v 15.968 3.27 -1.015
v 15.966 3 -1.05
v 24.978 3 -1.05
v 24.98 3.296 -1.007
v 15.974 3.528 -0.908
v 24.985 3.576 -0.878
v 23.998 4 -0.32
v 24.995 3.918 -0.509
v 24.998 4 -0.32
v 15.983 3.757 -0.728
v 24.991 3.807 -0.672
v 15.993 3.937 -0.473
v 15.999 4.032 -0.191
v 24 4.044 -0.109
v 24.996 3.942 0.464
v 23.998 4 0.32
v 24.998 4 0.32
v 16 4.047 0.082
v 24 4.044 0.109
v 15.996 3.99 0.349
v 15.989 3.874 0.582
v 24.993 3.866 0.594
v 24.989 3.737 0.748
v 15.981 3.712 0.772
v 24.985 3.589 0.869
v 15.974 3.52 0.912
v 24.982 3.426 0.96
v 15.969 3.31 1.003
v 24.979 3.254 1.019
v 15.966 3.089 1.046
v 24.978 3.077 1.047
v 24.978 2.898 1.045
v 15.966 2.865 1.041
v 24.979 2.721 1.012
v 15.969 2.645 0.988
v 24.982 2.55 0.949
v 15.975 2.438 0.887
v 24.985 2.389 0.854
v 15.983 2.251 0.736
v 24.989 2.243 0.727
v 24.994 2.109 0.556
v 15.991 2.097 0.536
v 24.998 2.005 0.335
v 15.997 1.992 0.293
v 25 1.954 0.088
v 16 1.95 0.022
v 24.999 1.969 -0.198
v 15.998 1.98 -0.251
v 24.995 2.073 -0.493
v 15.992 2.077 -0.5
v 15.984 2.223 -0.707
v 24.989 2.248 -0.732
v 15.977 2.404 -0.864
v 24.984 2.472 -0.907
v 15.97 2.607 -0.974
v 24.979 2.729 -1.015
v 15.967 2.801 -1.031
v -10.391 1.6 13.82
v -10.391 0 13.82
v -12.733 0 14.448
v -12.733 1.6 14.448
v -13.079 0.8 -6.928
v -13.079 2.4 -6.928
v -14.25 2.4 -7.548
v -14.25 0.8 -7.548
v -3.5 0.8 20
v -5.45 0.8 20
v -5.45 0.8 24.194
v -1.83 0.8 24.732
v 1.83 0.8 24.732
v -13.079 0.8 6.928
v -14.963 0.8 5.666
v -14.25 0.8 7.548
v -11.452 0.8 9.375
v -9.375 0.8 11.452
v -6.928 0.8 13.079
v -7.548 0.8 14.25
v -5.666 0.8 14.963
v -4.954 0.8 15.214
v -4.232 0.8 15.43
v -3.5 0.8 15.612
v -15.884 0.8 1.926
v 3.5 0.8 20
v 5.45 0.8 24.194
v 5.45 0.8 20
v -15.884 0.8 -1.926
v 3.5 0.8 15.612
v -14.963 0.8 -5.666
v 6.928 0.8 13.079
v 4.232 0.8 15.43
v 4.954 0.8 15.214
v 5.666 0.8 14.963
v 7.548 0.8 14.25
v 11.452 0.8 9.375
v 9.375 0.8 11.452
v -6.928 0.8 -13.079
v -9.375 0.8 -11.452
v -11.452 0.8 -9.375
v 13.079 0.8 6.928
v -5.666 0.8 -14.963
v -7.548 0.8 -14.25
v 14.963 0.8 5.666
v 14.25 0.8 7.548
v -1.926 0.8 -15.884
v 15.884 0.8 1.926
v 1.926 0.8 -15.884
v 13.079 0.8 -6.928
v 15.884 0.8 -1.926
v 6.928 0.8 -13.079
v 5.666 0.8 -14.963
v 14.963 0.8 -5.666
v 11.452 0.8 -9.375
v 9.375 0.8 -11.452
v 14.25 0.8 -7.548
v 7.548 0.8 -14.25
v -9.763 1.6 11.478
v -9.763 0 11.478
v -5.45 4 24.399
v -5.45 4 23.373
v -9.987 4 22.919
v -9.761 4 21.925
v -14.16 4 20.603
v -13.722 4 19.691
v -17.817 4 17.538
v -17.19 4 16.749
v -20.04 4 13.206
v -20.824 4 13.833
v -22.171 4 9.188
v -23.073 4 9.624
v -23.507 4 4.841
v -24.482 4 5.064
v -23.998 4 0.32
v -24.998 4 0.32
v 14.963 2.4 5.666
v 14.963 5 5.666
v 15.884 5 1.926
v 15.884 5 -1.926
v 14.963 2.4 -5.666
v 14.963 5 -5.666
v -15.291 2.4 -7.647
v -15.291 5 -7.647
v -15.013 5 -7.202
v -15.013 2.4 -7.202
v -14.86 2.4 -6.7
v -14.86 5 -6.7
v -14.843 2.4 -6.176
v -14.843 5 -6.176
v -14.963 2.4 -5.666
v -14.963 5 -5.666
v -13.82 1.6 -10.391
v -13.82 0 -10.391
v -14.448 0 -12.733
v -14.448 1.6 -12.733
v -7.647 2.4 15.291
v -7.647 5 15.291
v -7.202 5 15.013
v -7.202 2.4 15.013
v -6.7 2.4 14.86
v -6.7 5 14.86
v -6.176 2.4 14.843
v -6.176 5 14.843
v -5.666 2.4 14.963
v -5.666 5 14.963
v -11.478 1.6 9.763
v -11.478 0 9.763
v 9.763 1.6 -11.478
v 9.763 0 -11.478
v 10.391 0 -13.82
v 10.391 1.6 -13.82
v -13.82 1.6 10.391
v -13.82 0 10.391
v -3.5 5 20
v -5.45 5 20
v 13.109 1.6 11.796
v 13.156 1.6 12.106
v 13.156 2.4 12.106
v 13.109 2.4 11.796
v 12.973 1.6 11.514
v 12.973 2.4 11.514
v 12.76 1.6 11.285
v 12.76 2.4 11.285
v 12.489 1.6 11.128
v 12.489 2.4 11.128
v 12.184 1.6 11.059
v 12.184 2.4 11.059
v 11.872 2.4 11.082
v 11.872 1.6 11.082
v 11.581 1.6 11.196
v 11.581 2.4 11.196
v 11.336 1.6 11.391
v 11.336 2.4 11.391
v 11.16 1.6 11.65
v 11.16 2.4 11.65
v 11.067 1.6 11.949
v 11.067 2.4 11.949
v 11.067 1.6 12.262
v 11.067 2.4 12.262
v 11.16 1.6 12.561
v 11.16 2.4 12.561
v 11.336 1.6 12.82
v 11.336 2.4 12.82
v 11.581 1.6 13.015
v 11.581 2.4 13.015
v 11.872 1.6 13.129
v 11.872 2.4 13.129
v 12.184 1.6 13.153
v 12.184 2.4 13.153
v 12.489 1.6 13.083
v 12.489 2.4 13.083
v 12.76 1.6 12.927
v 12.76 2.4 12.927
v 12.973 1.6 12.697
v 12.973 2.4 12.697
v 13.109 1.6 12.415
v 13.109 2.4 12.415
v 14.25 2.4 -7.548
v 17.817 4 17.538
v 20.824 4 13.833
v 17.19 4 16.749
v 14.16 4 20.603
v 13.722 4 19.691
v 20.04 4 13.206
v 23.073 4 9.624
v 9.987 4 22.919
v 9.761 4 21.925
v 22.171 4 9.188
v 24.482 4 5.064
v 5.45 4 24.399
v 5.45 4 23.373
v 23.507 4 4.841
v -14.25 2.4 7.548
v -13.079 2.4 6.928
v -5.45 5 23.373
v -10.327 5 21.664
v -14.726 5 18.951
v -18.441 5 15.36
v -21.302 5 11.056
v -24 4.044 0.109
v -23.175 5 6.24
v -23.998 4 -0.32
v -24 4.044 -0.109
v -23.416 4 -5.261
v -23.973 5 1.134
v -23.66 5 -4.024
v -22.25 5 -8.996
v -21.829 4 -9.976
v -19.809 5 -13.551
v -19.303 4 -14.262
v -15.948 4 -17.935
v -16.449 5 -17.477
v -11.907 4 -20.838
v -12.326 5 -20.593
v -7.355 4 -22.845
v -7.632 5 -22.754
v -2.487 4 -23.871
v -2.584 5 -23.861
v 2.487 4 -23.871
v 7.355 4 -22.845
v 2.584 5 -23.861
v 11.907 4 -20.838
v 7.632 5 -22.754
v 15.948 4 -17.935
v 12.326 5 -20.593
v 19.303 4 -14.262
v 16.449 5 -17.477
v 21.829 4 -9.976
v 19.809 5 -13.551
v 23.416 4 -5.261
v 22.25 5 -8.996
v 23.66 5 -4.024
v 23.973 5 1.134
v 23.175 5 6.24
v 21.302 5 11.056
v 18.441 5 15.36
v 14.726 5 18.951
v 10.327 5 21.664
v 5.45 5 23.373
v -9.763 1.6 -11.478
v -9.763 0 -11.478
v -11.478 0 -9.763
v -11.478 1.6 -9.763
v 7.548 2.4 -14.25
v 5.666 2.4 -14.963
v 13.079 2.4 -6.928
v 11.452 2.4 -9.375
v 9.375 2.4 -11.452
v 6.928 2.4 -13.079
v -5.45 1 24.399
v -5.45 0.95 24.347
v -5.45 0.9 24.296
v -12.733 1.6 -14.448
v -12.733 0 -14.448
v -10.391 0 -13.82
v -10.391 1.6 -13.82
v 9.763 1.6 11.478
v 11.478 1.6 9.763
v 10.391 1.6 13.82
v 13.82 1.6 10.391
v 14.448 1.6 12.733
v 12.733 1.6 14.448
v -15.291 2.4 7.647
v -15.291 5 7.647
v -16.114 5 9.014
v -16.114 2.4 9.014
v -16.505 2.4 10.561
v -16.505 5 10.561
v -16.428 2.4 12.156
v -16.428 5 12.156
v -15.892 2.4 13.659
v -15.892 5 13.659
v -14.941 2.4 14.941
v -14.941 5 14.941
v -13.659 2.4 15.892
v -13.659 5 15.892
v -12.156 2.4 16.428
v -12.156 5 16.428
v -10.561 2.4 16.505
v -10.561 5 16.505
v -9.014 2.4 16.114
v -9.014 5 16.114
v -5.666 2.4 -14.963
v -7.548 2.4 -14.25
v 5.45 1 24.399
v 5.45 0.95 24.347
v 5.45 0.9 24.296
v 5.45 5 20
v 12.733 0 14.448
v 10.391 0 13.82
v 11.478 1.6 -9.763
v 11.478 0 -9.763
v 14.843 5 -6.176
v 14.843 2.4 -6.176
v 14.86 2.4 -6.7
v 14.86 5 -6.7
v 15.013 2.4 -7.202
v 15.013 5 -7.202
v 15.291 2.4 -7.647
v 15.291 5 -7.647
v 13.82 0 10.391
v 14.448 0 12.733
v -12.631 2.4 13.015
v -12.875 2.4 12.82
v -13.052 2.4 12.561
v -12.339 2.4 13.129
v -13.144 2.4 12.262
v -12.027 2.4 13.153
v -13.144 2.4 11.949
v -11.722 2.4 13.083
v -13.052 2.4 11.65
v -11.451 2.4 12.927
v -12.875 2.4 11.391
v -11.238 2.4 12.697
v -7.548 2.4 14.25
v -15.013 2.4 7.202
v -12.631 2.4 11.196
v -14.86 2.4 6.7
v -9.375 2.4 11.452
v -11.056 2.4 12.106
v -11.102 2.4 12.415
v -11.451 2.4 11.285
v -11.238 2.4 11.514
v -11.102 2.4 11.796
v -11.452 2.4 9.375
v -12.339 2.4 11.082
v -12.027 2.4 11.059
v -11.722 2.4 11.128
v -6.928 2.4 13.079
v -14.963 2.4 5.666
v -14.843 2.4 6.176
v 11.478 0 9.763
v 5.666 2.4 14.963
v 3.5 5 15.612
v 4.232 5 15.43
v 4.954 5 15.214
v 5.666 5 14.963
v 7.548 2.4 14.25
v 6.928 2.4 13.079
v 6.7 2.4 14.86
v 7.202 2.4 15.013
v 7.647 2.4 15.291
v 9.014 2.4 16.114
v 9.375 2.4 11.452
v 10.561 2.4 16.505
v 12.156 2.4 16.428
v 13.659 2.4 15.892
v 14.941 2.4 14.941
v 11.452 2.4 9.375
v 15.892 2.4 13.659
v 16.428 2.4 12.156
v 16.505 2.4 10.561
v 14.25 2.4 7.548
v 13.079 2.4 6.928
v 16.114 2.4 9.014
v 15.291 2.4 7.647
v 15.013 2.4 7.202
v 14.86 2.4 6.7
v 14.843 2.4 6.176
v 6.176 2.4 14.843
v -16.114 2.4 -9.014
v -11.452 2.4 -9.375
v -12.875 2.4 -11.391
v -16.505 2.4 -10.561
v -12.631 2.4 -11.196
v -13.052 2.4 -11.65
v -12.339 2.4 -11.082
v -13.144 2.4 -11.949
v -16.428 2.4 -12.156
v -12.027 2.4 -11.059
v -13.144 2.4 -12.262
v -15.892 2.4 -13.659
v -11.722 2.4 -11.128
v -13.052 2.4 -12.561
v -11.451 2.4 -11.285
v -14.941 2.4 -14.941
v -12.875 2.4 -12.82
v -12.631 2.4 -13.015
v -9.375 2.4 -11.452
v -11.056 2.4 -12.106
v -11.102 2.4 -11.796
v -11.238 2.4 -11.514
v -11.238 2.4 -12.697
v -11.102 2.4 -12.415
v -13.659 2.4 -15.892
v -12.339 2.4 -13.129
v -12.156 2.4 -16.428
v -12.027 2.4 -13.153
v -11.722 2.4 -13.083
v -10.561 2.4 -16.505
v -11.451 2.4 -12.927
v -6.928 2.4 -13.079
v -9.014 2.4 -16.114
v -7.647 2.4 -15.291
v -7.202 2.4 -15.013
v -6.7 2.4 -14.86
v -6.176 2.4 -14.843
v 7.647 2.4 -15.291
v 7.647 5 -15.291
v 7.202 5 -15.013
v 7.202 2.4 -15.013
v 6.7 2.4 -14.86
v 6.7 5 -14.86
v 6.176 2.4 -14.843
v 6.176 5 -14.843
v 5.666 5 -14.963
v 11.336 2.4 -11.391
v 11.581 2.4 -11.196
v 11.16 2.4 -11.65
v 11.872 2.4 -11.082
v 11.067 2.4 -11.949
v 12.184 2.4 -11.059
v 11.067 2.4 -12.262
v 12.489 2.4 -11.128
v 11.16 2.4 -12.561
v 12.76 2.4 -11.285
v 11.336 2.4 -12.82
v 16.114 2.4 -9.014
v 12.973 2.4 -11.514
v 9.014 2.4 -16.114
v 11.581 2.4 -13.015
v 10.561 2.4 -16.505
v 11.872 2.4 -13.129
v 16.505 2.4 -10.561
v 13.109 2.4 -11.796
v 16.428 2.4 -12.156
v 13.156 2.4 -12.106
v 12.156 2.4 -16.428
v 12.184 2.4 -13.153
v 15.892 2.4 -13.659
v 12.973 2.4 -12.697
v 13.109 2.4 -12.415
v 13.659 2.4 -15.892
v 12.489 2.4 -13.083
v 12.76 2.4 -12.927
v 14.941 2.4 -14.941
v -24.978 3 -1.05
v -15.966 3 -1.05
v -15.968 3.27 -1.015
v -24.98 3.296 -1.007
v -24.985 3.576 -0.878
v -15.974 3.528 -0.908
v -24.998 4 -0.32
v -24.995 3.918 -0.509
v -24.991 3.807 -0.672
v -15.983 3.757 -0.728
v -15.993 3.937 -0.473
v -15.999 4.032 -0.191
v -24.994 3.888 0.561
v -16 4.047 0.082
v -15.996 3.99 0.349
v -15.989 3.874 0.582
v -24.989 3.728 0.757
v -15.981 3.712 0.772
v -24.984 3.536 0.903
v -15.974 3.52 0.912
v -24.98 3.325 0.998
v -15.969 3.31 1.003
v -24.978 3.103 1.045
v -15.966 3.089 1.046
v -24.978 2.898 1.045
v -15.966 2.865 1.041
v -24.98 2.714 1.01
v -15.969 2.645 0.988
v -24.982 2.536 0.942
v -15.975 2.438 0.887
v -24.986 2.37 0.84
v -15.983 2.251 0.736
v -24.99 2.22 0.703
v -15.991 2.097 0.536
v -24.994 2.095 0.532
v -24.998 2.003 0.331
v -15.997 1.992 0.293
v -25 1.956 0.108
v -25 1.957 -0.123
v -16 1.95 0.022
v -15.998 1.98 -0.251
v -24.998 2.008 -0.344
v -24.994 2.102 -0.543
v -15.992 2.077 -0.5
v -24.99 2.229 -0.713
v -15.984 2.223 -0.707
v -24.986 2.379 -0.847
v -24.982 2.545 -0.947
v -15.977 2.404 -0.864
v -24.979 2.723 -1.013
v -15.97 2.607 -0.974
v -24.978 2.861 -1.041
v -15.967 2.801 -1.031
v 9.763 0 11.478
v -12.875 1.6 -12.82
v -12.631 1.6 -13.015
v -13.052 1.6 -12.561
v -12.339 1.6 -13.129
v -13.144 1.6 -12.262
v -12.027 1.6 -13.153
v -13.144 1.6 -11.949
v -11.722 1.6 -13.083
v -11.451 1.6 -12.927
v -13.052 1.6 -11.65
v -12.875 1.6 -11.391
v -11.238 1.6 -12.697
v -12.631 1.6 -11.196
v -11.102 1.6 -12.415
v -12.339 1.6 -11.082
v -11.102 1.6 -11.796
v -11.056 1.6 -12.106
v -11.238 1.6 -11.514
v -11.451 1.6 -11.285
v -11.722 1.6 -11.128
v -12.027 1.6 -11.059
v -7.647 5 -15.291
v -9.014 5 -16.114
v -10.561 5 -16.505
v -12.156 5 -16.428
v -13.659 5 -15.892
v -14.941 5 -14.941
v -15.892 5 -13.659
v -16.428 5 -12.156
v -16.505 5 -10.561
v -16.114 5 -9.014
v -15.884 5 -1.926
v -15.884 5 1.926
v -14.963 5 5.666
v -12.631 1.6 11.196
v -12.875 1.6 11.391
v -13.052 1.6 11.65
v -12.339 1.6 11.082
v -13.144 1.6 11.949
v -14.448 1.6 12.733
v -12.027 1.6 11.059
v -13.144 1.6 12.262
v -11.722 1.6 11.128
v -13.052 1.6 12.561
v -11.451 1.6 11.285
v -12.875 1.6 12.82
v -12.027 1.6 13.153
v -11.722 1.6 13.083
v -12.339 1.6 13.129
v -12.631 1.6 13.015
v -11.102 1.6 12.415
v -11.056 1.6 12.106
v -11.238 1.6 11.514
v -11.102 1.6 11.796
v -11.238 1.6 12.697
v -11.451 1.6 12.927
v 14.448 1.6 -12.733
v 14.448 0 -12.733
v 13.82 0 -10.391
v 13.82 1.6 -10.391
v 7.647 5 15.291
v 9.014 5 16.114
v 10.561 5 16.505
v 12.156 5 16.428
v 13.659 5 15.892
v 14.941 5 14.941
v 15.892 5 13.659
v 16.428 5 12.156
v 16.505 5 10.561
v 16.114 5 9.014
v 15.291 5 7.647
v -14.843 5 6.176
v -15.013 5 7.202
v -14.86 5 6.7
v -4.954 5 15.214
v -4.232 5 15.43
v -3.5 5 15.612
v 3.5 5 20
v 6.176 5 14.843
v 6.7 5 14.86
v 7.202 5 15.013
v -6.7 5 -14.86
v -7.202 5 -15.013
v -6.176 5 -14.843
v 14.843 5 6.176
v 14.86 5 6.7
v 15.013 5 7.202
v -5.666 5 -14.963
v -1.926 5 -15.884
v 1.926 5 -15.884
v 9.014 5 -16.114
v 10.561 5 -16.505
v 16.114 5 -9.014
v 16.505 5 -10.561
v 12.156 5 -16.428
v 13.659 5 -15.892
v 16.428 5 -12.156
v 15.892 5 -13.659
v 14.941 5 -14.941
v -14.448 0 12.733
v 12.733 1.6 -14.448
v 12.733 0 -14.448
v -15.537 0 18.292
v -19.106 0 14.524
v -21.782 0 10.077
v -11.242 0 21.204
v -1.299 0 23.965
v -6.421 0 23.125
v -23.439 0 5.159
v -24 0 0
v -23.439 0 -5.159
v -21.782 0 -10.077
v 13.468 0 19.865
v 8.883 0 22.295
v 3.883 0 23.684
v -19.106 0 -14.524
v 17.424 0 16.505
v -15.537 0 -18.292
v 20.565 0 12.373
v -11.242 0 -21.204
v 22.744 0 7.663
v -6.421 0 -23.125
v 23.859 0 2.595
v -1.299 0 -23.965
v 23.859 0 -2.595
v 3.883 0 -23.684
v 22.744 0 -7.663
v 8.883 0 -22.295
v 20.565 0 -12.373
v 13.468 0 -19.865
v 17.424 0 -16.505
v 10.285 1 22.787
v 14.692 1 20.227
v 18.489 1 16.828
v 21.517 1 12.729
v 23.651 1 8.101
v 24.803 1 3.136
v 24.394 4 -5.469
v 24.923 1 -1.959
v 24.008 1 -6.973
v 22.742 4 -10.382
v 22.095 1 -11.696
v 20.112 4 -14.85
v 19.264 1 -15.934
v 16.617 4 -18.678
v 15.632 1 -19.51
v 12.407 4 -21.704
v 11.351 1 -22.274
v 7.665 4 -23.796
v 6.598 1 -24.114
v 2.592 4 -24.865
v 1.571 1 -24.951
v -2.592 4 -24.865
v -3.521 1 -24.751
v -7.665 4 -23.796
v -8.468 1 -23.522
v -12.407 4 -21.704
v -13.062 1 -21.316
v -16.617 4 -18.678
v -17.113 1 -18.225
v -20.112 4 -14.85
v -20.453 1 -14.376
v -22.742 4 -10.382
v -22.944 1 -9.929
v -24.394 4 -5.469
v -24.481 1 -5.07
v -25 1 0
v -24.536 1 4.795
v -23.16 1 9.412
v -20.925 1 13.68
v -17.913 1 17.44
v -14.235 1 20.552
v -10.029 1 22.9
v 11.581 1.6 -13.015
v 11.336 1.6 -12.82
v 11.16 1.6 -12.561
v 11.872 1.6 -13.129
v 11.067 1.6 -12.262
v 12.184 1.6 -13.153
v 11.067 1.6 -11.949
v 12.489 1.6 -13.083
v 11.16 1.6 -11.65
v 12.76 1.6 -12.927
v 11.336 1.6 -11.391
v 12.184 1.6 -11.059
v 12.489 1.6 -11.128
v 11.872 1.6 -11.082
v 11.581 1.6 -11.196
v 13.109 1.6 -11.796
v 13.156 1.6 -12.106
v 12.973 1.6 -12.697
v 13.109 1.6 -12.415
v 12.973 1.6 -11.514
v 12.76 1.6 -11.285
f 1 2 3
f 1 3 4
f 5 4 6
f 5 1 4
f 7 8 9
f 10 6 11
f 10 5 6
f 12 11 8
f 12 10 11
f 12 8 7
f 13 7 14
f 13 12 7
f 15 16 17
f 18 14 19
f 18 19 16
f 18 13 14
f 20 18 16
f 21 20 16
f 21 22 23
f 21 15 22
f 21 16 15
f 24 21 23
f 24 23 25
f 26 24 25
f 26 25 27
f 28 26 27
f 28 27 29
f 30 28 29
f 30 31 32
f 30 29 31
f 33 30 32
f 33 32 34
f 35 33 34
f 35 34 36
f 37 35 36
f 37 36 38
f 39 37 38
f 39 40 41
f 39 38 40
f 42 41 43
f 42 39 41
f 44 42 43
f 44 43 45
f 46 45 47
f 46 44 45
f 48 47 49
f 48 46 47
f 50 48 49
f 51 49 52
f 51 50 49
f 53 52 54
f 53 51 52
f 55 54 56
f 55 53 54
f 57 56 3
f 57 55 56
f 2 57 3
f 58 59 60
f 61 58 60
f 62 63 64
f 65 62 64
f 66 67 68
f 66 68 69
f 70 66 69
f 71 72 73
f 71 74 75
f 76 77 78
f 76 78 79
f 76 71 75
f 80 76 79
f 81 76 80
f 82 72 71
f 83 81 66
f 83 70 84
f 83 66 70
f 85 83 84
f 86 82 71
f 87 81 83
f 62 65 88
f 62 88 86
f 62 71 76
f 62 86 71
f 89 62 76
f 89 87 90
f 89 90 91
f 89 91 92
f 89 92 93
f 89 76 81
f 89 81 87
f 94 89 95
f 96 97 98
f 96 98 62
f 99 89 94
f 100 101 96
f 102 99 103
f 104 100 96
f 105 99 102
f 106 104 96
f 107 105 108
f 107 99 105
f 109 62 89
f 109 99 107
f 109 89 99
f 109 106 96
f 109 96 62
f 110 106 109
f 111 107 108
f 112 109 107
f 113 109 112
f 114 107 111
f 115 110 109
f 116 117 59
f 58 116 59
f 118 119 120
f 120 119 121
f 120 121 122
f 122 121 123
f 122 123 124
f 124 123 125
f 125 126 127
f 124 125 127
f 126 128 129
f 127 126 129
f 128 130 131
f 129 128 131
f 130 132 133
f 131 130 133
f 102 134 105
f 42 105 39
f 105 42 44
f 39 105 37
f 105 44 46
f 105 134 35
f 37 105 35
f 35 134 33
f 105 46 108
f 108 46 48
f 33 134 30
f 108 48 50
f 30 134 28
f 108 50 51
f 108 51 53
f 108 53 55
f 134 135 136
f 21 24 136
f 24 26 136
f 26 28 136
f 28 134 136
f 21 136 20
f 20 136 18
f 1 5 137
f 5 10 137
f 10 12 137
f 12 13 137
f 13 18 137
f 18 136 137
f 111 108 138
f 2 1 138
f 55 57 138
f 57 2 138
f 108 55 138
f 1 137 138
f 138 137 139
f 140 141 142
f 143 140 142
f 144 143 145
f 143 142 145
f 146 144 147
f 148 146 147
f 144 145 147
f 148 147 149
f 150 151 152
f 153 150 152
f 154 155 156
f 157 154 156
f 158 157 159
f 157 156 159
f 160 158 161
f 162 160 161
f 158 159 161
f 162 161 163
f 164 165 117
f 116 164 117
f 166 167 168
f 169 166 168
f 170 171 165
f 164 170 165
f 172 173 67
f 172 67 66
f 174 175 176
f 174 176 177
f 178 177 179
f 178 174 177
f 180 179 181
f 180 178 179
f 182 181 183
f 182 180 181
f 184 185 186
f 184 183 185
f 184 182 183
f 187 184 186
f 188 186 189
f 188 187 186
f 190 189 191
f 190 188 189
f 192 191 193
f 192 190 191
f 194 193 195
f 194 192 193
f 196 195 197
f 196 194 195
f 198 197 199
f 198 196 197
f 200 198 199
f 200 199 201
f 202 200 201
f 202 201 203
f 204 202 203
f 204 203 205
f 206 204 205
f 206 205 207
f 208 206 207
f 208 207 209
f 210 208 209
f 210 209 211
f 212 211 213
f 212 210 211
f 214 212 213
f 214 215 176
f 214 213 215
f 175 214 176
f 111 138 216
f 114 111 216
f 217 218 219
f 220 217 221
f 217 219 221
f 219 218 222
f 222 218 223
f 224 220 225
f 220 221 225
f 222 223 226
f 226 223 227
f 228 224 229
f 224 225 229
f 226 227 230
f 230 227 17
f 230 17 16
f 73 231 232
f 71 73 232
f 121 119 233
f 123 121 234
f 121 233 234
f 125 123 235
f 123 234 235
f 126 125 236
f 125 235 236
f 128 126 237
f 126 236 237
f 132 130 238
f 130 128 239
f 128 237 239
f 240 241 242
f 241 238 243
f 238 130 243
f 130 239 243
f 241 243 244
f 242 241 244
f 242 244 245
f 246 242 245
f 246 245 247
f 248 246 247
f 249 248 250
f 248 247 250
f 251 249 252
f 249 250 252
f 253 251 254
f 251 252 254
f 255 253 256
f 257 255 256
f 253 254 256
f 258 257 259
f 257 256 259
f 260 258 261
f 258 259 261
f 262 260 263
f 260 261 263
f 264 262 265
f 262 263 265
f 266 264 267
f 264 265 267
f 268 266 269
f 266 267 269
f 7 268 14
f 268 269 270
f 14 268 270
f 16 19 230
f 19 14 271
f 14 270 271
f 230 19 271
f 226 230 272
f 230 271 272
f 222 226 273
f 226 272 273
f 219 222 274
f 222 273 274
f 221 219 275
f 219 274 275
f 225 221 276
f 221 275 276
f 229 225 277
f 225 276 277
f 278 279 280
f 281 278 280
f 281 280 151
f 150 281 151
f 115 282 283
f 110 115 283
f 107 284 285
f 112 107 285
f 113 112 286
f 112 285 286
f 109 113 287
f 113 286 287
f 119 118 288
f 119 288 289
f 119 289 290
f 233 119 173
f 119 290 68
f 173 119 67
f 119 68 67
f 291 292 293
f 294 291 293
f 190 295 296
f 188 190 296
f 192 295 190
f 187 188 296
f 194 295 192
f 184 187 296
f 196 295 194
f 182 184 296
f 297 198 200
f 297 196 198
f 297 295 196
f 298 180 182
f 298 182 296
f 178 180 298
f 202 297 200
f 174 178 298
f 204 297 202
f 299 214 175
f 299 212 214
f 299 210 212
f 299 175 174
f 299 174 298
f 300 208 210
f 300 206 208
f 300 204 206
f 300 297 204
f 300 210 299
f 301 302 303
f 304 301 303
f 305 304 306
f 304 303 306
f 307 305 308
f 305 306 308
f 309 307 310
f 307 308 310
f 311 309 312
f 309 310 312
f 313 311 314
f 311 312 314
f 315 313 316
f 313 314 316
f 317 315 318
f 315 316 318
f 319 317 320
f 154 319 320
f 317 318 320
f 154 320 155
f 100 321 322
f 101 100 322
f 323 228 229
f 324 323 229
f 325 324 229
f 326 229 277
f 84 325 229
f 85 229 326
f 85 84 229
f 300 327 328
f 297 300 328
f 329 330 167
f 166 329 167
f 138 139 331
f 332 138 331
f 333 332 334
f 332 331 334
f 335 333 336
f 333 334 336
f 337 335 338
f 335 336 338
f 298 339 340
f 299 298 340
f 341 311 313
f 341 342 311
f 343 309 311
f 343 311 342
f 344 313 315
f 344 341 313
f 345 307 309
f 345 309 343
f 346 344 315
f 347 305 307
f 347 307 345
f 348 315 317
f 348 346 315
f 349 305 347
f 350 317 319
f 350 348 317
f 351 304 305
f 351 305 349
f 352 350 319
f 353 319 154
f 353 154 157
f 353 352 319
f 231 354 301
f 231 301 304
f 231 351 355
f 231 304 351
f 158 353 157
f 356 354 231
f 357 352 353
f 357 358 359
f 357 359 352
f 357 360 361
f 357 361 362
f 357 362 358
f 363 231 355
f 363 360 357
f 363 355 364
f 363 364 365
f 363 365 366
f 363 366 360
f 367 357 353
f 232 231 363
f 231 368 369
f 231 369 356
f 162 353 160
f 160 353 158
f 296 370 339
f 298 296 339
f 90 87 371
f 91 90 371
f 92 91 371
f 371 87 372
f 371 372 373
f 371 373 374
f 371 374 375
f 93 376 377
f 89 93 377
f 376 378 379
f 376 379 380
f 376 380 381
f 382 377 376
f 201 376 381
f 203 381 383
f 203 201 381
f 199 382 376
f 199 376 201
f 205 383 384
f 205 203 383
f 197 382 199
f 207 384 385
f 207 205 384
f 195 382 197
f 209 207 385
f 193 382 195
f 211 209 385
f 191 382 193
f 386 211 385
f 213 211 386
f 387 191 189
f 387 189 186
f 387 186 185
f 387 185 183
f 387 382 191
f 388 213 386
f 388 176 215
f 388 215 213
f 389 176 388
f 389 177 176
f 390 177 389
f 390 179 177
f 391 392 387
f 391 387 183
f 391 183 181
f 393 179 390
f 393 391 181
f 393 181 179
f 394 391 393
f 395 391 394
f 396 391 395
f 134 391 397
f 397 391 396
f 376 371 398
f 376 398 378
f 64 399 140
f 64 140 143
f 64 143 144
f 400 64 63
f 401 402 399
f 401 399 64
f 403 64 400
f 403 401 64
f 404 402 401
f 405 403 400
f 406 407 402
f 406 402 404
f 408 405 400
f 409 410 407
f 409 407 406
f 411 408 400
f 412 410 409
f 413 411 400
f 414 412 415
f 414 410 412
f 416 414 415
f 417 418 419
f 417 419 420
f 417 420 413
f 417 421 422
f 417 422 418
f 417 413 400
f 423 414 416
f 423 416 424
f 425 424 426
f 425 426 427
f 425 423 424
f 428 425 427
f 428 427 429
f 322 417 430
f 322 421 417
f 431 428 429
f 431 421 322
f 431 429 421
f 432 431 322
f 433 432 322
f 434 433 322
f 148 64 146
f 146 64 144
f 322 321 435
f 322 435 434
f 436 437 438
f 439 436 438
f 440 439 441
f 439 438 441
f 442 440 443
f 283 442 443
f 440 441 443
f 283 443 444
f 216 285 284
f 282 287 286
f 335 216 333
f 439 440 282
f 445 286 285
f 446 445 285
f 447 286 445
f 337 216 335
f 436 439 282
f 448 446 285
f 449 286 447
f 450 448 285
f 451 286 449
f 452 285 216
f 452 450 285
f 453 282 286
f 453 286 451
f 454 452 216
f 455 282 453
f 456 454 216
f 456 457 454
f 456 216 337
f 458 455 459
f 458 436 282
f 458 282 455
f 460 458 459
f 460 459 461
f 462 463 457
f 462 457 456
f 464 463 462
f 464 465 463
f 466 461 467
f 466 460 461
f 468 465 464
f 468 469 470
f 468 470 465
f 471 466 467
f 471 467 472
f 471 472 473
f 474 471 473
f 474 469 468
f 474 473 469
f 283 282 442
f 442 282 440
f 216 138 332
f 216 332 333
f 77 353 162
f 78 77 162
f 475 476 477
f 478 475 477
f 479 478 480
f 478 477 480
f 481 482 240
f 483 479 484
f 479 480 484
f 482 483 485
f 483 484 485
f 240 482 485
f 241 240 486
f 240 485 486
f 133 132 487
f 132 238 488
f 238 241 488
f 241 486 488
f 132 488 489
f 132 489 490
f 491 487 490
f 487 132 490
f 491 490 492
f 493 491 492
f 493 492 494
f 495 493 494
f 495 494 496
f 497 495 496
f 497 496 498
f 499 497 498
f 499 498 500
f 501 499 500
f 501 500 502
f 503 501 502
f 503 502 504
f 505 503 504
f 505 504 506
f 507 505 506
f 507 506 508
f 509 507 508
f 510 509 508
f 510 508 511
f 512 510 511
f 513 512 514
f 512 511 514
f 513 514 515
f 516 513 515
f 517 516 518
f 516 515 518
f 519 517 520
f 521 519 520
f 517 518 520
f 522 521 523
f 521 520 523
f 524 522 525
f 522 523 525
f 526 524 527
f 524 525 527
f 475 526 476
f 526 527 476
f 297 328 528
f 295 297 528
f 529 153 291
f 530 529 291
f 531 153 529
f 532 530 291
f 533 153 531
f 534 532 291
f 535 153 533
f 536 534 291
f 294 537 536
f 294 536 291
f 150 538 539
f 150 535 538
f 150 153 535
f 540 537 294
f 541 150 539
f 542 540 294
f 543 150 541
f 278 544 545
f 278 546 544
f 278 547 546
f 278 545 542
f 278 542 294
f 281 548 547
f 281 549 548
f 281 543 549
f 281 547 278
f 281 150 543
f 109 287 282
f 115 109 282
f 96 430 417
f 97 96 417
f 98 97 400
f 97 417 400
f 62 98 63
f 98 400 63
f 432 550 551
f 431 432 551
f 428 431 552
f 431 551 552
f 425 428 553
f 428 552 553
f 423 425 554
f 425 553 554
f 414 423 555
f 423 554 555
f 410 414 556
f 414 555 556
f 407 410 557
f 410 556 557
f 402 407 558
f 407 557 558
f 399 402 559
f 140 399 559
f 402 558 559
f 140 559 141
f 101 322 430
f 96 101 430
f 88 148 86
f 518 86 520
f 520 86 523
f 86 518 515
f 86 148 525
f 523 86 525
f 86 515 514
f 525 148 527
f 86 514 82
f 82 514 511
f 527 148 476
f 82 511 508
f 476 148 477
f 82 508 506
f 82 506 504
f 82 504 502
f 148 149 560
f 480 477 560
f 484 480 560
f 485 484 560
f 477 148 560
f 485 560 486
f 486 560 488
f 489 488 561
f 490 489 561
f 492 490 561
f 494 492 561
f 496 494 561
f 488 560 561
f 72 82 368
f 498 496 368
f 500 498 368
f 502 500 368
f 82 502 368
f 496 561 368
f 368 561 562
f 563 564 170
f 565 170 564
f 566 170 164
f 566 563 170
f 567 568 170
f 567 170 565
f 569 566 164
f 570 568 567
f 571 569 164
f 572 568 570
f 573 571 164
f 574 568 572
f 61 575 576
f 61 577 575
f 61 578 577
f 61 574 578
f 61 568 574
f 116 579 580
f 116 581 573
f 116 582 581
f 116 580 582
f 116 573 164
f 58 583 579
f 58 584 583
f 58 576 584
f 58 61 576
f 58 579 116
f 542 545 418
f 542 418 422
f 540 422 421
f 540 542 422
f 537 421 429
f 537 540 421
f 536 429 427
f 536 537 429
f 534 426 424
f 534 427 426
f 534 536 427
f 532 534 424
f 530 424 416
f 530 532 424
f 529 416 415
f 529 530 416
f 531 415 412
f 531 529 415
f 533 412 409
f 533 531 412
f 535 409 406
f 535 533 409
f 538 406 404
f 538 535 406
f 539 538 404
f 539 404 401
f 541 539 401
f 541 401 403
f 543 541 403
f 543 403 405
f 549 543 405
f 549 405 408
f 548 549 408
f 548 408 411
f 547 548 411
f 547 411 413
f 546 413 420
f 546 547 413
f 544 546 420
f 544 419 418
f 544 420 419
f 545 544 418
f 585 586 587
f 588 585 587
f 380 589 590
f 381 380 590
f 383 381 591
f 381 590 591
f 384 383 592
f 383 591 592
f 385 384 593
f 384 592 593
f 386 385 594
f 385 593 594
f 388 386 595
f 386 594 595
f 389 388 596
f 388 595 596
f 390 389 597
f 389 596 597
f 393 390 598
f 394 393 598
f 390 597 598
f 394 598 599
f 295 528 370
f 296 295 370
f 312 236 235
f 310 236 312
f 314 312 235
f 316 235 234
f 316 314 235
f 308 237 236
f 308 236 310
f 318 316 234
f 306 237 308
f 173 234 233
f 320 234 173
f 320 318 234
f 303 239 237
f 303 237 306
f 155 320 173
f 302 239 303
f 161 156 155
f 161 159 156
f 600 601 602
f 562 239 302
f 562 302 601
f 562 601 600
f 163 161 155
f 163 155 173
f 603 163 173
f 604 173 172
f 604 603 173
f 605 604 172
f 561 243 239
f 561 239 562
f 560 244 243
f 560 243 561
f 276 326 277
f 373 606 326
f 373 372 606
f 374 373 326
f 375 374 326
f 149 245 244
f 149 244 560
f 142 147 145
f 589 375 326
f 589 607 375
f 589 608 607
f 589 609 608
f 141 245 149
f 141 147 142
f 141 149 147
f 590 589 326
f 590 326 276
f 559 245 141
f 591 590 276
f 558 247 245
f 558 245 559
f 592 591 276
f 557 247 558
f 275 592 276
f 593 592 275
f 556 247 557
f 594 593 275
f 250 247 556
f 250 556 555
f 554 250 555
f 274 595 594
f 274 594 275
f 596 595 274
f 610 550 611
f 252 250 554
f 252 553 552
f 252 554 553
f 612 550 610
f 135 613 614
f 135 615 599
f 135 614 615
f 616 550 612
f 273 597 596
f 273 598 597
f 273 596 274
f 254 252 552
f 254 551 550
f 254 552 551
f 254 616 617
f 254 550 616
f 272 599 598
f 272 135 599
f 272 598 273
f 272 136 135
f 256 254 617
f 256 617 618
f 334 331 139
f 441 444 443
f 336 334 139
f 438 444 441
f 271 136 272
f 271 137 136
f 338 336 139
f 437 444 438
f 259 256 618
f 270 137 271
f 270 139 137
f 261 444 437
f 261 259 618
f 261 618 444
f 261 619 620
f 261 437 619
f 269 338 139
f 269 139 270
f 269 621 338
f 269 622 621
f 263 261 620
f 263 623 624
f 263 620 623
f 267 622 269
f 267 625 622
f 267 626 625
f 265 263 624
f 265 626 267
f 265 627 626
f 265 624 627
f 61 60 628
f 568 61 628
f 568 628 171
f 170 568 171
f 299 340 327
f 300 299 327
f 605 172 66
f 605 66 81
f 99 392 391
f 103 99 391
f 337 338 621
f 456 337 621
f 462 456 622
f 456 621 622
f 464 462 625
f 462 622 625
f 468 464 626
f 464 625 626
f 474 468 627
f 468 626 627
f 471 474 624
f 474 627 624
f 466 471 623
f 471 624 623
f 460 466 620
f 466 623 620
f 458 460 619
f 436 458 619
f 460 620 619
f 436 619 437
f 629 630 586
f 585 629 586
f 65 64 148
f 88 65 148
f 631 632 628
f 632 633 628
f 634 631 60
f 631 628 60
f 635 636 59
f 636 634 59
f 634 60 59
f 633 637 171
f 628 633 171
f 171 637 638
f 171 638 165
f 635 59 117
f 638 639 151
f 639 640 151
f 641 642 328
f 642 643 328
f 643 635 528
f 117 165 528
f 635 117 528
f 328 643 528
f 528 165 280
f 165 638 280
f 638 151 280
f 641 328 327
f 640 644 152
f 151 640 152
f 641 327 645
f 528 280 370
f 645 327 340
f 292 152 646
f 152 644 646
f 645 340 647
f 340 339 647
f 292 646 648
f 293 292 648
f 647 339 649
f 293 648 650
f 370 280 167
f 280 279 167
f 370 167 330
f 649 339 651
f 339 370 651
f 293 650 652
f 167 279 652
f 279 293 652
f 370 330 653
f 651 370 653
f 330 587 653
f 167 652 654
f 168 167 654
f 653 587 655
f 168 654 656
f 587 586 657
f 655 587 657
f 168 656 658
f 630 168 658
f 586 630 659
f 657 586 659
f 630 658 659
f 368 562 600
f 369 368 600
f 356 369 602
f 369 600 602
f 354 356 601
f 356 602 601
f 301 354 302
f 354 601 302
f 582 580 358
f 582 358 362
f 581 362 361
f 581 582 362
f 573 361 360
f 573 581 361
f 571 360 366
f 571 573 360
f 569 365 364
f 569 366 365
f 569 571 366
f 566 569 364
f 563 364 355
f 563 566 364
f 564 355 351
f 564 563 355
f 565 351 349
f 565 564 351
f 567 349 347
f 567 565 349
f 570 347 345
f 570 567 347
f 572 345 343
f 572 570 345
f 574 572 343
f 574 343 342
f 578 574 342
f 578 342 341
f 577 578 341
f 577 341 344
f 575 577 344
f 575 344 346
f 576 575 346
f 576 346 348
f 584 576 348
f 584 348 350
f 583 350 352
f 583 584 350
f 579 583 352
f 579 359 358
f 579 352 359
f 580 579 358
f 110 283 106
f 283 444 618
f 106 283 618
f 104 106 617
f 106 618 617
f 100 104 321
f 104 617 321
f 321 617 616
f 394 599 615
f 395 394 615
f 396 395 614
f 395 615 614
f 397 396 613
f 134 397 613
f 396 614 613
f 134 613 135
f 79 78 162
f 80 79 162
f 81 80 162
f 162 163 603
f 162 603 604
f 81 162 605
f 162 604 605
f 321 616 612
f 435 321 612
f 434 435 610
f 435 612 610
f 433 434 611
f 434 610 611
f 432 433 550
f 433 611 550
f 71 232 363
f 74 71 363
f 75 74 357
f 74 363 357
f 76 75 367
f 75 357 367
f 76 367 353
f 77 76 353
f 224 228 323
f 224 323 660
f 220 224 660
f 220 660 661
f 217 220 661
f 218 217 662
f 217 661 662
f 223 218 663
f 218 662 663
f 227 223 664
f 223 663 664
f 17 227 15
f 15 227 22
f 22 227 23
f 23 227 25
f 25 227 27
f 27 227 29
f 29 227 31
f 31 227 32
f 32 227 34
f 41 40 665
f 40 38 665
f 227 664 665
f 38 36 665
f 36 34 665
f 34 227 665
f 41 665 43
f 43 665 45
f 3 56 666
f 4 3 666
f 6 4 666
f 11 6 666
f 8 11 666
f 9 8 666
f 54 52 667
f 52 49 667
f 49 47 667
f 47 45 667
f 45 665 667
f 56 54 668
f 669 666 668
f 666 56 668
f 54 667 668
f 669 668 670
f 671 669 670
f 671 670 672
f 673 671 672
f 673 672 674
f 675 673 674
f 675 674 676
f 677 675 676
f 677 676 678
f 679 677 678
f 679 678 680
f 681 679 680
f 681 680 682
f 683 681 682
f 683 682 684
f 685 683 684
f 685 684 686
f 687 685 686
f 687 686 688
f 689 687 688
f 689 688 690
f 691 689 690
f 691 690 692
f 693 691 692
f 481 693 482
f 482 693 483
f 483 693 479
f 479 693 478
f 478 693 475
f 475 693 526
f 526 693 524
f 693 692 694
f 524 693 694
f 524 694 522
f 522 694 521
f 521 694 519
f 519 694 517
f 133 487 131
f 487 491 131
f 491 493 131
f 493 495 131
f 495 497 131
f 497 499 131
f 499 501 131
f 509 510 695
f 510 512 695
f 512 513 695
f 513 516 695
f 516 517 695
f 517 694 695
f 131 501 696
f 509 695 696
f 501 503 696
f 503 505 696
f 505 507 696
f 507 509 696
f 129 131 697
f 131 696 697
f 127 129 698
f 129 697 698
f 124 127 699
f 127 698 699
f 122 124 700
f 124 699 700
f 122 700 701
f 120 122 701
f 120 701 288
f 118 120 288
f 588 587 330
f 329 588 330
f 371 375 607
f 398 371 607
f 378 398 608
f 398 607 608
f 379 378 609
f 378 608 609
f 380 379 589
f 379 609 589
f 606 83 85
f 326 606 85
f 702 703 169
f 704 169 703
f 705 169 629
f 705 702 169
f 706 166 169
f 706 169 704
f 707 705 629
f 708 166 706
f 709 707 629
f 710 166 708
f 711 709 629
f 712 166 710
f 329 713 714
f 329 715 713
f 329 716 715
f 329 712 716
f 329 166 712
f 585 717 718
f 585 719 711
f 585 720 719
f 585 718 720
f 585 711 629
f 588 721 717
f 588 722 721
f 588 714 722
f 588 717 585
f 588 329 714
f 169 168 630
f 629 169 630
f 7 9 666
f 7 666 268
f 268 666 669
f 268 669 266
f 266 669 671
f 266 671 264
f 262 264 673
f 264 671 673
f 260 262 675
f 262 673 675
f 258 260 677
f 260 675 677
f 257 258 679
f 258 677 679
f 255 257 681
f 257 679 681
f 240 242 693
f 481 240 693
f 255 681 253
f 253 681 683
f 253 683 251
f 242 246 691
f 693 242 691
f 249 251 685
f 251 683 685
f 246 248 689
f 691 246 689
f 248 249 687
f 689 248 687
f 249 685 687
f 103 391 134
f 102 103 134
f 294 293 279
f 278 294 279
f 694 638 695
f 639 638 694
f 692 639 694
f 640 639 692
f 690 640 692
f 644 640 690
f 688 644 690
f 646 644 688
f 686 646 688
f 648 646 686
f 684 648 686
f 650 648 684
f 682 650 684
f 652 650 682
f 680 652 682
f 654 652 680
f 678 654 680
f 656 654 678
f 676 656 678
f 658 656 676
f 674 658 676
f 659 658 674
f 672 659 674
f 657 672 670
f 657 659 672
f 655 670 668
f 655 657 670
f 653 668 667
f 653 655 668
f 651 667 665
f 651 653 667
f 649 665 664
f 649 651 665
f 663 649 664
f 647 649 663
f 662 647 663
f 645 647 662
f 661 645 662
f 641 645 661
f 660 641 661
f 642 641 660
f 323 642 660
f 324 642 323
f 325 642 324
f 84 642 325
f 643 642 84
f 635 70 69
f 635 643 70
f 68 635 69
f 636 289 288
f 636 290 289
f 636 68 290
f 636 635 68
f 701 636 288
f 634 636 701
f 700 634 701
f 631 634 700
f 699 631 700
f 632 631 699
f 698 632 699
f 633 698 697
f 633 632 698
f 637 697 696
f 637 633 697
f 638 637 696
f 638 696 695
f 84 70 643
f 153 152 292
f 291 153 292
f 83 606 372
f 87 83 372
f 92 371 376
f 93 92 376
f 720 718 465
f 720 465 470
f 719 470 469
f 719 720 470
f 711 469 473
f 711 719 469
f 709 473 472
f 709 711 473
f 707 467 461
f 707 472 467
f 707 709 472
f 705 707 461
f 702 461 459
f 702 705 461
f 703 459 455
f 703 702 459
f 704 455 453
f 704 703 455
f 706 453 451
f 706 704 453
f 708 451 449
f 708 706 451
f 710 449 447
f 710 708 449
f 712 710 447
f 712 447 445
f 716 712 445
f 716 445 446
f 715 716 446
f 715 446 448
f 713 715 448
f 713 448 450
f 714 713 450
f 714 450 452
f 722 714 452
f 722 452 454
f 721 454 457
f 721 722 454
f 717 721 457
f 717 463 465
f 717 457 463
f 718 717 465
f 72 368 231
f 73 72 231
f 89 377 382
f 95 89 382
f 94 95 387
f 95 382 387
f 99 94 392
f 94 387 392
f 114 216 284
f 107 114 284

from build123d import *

# Parameters (mm, degrees)
SKETCH1_R               = 25
BOSS_EXTRUDE1_DEPTH     = 5
CUT_EXTRUDE1_START      = 5
CUT_EXTRUDE1_DEPTH      = 2.6
SKETCH1_5_R             = 1.05
CUT_EXTRUDE2_DEPTH      = 6
CUT_EXTRUDE4_DEPTH      = 1.6
CUT_EXTRUDE5_DEPTH      = 1.6
SKETCH5_W               = 7
SKETCH5_H               = 25
CUT_EXTRUDE6_DEPTH      = 4.2
SKETCH6_W               = 10.9
SKETCH6_H               = 5
CUT_EXTRUDE7_DEPTH      = 5.2
SKETCH7_W               = 1
SKETCH7_H               = 1
SKETCH8_R               = 1.05
CUT_EXTRUDE8_DEPTH      = 26
CUT_EXTRUDE8_DEPTH_BACK = 26


with BuildPart() as part:
    # Sketch1 → Boss-Extrude1 (new body)
    with BuildSketch(Plane(origin=(0, 0, 0), x_dir=(1, 0, 0), z_dir=(0, 1, 0))):
        Circle(SKETCH1_R)
    extrude(amount=BOSS_EXTRUDE1_DEPTH)

    # Sketch1<4> → Cut-Extrude1 (cut)
    with BuildSketch(Plane(origin=(0, 0, 0), x_dir=(1, 0, 0), z_dir=(0, 1, 0)).offset(CUT_EXTRUDE1_START)):
        with BuildLine():
            ThreePointArc((-7.646663173, 15.290666359), (-14.941166286, 14.941166286), (-15.290666359, 7.646663173))
            ThreePointArc((-15.290666359, 7.646663173), (-14.860391858, 6.700345618), (-14.963208205, 5.665898006))
            ThreePointArc((-14.963208205, 5.665898006), (-16, 0), (-14.963208205, -5.665898006))
            ThreePointArc((-14.963208205, -5.665898006), (-14.860391858, -6.700345618), (-15.290666359, -7.646663173))
            ThreePointArc((-15.290666359, -7.646663173), (-14.941166286, -14.941166286), (-7.646663173, -15.290666359))
            ThreePointArc((-7.646663173, -15.290666359), (-6.700345618, -14.860391858), (-5.665898006, -14.963208205))
            ThreePointArc((-5.665898006, -14.963208205), (0, -16), (5.665898006, -14.963208205))
            ThreePointArc((5.665898006, -14.963208205), (6.700345618, -14.860391858), (7.646663173, -15.290666359))
            ThreePointArc((7.646663173, -15.290666359), (14.941166286, -14.941166286), (15.290666359, -7.646663173))
            ThreePointArc((15.290666359, -7.646663173), (14.860391858, -6.700345618), (14.963208205, -5.665898006))
            ThreePointArc((14.963208205, -5.665898006), (16, 0), (14.963208205, 5.665898006))
            ThreePointArc((14.963208205, 5.665898006), (14.860391858, 6.700345618), (15.290666359, 7.646663173))
            ThreePointArc((15.290666359, 7.646663173), (14.941166286, 14.941166286), (7.646663173, 15.290666359))
            ThreePointArc((7.646663173, 15.290666359), (6.700345618, 14.860391858), (5.665898006, 14.963208205))
            ThreePointArc((5.665898006, 14.963208205), (0, 16), (-5.665898006, 14.963208205))
            ThreePointArc((-5.665898006, 14.963208205), (-6.700345618, 14.860391858), (-7.646663173, 15.290666359))
        make_face()
    extrude(amount=-CUT_EXTRUDE1_DEPTH, mode=Mode.SUBTRACT)

    # Sketch1<5> → Cut-Extrude2 (cut, through all)
    with BuildSketch(Plane(origin=(0, 0, 0), x_dir=(1, 0, 0), z_dir=(0, 1, 0))):
        with Locations((12.105668094, 12.105668094)):
            Circle(SKETCH1_5_R)
        with Locations((12.105668094, -12.105668094)):
            Circle(SKETCH1_5_R)
        with Locations((-12.105668094, -12.105668094)):
            Circle(SKETCH1_5_R)
        with Locations((-12.105668094, 12.105668094)):
            Circle(SKETCH1_5_R)
    extrude(amount=CUT_EXTRUDE2_DEPTH, mode=Mode.SUBTRACT)

    # Sketch3 → Cut-Extrude4 (cut)
    with BuildSketch(Plane(origin=(0, 2.4, 0), x_dir=(1, 0, 0), z_dir=(0, 1, 0))):
        with BuildLine():
            Line((-14.250424192, -7.548306686), (-13.078556304, -6.927580025))
            ThreePointArc((-13.078556304, -6.927580025), (-10.465180362, -10.465180362), (-6.927580025, -13.078556304))
            Line((-6.927580025, -13.078556304), (-7.548306686, -14.250424192))
            Line((-7.548306686, -14.250424192), (-5.665898006, -14.963208205))
            ThreePointArc((-5.665898006, -14.963208205), (0, -16), (5.665898006, -14.963208205))
            Line((5.665898006, -14.963208205), (7.548306686, -14.250424192))
            Line((7.548306686, -14.250424192), (6.927580025, -13.078556304))
            ThreePointArc((6.927580025, -13.078556304), (10.465180362, -10.465180362), (13.078556304, -6.927580025))
            Line((13.078556304, -6.927580025), (14.250424192, -7.548306686))
            Line((14.250424192, -7.548306686), (14.963208205, -5.665898006))
            ThreePointArc((14.963208205, -5.665898006), (16, 0), (14.963208205, 5.665898006))
            Line((14.963208205, 5.665898006), (14.250424192, 7.548306686))
            Line((14.250424192, 7.548306686), (13.078556304, 6.927580025))
            ThreePointArc((13.078556304, 6.927580025), (10.465180362, 10.465180362), (6.927580025, 13.078556304))
            Line((6.927580025, 13.078556304), (7.548306686, 14.250424192))
            Line((7.548306686, 14.250424192), (5.665898006, 14.963208205))
            ThreePointArc((5.665898006, 14.963208205), (0, 16), (-5.665898006, 14.963208205))
            Line((-5.665898006, 14.963208205), (-7.548306686, 14.250424192))
            Line((-7.548306686, 14.250424192), (-6.927580025, 13.078556304))
            ThreePointArc((-6.927580025, 13.078556304), (-10.465180362, 10.465180362), (-13.078556304, 6.927580025))
            Line((-13.078556304, 6.927580025), (-14.250424192, 7.548306686))
            Line((-14.250424192, 7.548306686), (-14.963208205, 5.665898006))
            ThreePointArc((-14.963208205, 5.665898006), (-16, 0), (-14.963208205, -5.665898006))
            Line((-14.963208205, -5.665898006), (-14.250424192, -7.548306686))
        make_face()
    extrude(amount=-CUT_EXTRUDE4_DEPTH, mode=Mode.SUBTRACT)

    # Sketch4 → Cut-Extrude5 (cut)
    with BuildSketch(Plane.XZ):
        Polygon((-10.391025274, 13.820310914), (-12.733270924, 14.447913744), (-14.447913744, 12.733270924), (-13.820310914, 10.391025274), (-11.478065263, 9.763422443), (-9.763422443, 11.478065263), align=None)
        Polygon((13.820310914, 10.391025274), (14.447913744, 12.733270924), (12.733270924, 14.447913744), (10.391025274, 13.820310914), (9.763422443, 11.478065263), (11.478065263, 9.763422443), align=None)
        Polygon((10.391025274, -13.820310914), (12.733270924, -14.447913744), (14.447913744, -12.733270924), (13.820310914, -10.391025274), (11.478065263, -9.763422443), (9.763422443, -11.478065263), align=None)
        Polygon((-13.820310914, -10.391025274), (-14.447913744, -12.733270924), (-12.733270924, -14.447913744), (-10.391025274, -13.820310914), (-9.763422443, -11.478065263), (-11.478065263, -9.763422443), align=None)
    extrude(amount=-CUT_EXTRUDE5_DEPTH, mode=Mode.SUBTRACT)

    # Sketch5 → Cut-Extrude6 (cut)
    with BuildSketch(Plane(origin=(0, 5, 0), x_dir=(1, 0, 0), z_dir=(0, 1, 0))):
        with Locations((0, -12.5)):
            Rectangle(SKETCH5_W, SKETCH5_H)
    extrude(amount=-CUT_EXTRUDE6_DEPTH, mode=Mode.SUBTRACT)

    # Sketch6 → Cut-Extrude7 (cut, through all)
    with BuildSketch(Plane(origin=(0, 0.8, 0), x_dir=(1, 0, 0), z_dir=(0, 1, 0))):
        with Locations((0, -22.5)):
            Rectangle(SKETCH6_W, SKETCH6_H)
    extrude(amount=CUT_EXTRUDE7_DEPTH, mode=Mode.SUBTRACT)

    # Sketch7 → Cut-Revolve1 (revolve, cut)
    with BuildSketch(Plane.XY):
        Polygon((-25, 1), (-24, 0), (-25, 0), align=None)
        with Locations((-24.5, 4.5)):
            Rectangle(SKETCH7_W, SKETCH7_H)
    revolve(axis=Axis((0, 5.25, 0), (0, -1, 0)), mode=Mode.SUBTRACT)

    # Sketch8 → Cut-Extrude8 (cut, two sides)
    with BuildSketch(Plane(origin=(0, 0, 0), x_dir=(0, 0, -1), z_dir=(1, 0, 0))) as cut_extrude8_sk:
        with Locations((0, 3)):
            Circle(SKETCH8_R)
    extrude(amount=CUT_EXTRUDE8_DEPTH, mode=Mode.SUBTRACT)
    extrude(cut_extrude8_sk.sketch, amount=-CUT_EXTRUDE8_DEPTH_BACK, mode=Mode.SUBTRACT)


solid = part.part
